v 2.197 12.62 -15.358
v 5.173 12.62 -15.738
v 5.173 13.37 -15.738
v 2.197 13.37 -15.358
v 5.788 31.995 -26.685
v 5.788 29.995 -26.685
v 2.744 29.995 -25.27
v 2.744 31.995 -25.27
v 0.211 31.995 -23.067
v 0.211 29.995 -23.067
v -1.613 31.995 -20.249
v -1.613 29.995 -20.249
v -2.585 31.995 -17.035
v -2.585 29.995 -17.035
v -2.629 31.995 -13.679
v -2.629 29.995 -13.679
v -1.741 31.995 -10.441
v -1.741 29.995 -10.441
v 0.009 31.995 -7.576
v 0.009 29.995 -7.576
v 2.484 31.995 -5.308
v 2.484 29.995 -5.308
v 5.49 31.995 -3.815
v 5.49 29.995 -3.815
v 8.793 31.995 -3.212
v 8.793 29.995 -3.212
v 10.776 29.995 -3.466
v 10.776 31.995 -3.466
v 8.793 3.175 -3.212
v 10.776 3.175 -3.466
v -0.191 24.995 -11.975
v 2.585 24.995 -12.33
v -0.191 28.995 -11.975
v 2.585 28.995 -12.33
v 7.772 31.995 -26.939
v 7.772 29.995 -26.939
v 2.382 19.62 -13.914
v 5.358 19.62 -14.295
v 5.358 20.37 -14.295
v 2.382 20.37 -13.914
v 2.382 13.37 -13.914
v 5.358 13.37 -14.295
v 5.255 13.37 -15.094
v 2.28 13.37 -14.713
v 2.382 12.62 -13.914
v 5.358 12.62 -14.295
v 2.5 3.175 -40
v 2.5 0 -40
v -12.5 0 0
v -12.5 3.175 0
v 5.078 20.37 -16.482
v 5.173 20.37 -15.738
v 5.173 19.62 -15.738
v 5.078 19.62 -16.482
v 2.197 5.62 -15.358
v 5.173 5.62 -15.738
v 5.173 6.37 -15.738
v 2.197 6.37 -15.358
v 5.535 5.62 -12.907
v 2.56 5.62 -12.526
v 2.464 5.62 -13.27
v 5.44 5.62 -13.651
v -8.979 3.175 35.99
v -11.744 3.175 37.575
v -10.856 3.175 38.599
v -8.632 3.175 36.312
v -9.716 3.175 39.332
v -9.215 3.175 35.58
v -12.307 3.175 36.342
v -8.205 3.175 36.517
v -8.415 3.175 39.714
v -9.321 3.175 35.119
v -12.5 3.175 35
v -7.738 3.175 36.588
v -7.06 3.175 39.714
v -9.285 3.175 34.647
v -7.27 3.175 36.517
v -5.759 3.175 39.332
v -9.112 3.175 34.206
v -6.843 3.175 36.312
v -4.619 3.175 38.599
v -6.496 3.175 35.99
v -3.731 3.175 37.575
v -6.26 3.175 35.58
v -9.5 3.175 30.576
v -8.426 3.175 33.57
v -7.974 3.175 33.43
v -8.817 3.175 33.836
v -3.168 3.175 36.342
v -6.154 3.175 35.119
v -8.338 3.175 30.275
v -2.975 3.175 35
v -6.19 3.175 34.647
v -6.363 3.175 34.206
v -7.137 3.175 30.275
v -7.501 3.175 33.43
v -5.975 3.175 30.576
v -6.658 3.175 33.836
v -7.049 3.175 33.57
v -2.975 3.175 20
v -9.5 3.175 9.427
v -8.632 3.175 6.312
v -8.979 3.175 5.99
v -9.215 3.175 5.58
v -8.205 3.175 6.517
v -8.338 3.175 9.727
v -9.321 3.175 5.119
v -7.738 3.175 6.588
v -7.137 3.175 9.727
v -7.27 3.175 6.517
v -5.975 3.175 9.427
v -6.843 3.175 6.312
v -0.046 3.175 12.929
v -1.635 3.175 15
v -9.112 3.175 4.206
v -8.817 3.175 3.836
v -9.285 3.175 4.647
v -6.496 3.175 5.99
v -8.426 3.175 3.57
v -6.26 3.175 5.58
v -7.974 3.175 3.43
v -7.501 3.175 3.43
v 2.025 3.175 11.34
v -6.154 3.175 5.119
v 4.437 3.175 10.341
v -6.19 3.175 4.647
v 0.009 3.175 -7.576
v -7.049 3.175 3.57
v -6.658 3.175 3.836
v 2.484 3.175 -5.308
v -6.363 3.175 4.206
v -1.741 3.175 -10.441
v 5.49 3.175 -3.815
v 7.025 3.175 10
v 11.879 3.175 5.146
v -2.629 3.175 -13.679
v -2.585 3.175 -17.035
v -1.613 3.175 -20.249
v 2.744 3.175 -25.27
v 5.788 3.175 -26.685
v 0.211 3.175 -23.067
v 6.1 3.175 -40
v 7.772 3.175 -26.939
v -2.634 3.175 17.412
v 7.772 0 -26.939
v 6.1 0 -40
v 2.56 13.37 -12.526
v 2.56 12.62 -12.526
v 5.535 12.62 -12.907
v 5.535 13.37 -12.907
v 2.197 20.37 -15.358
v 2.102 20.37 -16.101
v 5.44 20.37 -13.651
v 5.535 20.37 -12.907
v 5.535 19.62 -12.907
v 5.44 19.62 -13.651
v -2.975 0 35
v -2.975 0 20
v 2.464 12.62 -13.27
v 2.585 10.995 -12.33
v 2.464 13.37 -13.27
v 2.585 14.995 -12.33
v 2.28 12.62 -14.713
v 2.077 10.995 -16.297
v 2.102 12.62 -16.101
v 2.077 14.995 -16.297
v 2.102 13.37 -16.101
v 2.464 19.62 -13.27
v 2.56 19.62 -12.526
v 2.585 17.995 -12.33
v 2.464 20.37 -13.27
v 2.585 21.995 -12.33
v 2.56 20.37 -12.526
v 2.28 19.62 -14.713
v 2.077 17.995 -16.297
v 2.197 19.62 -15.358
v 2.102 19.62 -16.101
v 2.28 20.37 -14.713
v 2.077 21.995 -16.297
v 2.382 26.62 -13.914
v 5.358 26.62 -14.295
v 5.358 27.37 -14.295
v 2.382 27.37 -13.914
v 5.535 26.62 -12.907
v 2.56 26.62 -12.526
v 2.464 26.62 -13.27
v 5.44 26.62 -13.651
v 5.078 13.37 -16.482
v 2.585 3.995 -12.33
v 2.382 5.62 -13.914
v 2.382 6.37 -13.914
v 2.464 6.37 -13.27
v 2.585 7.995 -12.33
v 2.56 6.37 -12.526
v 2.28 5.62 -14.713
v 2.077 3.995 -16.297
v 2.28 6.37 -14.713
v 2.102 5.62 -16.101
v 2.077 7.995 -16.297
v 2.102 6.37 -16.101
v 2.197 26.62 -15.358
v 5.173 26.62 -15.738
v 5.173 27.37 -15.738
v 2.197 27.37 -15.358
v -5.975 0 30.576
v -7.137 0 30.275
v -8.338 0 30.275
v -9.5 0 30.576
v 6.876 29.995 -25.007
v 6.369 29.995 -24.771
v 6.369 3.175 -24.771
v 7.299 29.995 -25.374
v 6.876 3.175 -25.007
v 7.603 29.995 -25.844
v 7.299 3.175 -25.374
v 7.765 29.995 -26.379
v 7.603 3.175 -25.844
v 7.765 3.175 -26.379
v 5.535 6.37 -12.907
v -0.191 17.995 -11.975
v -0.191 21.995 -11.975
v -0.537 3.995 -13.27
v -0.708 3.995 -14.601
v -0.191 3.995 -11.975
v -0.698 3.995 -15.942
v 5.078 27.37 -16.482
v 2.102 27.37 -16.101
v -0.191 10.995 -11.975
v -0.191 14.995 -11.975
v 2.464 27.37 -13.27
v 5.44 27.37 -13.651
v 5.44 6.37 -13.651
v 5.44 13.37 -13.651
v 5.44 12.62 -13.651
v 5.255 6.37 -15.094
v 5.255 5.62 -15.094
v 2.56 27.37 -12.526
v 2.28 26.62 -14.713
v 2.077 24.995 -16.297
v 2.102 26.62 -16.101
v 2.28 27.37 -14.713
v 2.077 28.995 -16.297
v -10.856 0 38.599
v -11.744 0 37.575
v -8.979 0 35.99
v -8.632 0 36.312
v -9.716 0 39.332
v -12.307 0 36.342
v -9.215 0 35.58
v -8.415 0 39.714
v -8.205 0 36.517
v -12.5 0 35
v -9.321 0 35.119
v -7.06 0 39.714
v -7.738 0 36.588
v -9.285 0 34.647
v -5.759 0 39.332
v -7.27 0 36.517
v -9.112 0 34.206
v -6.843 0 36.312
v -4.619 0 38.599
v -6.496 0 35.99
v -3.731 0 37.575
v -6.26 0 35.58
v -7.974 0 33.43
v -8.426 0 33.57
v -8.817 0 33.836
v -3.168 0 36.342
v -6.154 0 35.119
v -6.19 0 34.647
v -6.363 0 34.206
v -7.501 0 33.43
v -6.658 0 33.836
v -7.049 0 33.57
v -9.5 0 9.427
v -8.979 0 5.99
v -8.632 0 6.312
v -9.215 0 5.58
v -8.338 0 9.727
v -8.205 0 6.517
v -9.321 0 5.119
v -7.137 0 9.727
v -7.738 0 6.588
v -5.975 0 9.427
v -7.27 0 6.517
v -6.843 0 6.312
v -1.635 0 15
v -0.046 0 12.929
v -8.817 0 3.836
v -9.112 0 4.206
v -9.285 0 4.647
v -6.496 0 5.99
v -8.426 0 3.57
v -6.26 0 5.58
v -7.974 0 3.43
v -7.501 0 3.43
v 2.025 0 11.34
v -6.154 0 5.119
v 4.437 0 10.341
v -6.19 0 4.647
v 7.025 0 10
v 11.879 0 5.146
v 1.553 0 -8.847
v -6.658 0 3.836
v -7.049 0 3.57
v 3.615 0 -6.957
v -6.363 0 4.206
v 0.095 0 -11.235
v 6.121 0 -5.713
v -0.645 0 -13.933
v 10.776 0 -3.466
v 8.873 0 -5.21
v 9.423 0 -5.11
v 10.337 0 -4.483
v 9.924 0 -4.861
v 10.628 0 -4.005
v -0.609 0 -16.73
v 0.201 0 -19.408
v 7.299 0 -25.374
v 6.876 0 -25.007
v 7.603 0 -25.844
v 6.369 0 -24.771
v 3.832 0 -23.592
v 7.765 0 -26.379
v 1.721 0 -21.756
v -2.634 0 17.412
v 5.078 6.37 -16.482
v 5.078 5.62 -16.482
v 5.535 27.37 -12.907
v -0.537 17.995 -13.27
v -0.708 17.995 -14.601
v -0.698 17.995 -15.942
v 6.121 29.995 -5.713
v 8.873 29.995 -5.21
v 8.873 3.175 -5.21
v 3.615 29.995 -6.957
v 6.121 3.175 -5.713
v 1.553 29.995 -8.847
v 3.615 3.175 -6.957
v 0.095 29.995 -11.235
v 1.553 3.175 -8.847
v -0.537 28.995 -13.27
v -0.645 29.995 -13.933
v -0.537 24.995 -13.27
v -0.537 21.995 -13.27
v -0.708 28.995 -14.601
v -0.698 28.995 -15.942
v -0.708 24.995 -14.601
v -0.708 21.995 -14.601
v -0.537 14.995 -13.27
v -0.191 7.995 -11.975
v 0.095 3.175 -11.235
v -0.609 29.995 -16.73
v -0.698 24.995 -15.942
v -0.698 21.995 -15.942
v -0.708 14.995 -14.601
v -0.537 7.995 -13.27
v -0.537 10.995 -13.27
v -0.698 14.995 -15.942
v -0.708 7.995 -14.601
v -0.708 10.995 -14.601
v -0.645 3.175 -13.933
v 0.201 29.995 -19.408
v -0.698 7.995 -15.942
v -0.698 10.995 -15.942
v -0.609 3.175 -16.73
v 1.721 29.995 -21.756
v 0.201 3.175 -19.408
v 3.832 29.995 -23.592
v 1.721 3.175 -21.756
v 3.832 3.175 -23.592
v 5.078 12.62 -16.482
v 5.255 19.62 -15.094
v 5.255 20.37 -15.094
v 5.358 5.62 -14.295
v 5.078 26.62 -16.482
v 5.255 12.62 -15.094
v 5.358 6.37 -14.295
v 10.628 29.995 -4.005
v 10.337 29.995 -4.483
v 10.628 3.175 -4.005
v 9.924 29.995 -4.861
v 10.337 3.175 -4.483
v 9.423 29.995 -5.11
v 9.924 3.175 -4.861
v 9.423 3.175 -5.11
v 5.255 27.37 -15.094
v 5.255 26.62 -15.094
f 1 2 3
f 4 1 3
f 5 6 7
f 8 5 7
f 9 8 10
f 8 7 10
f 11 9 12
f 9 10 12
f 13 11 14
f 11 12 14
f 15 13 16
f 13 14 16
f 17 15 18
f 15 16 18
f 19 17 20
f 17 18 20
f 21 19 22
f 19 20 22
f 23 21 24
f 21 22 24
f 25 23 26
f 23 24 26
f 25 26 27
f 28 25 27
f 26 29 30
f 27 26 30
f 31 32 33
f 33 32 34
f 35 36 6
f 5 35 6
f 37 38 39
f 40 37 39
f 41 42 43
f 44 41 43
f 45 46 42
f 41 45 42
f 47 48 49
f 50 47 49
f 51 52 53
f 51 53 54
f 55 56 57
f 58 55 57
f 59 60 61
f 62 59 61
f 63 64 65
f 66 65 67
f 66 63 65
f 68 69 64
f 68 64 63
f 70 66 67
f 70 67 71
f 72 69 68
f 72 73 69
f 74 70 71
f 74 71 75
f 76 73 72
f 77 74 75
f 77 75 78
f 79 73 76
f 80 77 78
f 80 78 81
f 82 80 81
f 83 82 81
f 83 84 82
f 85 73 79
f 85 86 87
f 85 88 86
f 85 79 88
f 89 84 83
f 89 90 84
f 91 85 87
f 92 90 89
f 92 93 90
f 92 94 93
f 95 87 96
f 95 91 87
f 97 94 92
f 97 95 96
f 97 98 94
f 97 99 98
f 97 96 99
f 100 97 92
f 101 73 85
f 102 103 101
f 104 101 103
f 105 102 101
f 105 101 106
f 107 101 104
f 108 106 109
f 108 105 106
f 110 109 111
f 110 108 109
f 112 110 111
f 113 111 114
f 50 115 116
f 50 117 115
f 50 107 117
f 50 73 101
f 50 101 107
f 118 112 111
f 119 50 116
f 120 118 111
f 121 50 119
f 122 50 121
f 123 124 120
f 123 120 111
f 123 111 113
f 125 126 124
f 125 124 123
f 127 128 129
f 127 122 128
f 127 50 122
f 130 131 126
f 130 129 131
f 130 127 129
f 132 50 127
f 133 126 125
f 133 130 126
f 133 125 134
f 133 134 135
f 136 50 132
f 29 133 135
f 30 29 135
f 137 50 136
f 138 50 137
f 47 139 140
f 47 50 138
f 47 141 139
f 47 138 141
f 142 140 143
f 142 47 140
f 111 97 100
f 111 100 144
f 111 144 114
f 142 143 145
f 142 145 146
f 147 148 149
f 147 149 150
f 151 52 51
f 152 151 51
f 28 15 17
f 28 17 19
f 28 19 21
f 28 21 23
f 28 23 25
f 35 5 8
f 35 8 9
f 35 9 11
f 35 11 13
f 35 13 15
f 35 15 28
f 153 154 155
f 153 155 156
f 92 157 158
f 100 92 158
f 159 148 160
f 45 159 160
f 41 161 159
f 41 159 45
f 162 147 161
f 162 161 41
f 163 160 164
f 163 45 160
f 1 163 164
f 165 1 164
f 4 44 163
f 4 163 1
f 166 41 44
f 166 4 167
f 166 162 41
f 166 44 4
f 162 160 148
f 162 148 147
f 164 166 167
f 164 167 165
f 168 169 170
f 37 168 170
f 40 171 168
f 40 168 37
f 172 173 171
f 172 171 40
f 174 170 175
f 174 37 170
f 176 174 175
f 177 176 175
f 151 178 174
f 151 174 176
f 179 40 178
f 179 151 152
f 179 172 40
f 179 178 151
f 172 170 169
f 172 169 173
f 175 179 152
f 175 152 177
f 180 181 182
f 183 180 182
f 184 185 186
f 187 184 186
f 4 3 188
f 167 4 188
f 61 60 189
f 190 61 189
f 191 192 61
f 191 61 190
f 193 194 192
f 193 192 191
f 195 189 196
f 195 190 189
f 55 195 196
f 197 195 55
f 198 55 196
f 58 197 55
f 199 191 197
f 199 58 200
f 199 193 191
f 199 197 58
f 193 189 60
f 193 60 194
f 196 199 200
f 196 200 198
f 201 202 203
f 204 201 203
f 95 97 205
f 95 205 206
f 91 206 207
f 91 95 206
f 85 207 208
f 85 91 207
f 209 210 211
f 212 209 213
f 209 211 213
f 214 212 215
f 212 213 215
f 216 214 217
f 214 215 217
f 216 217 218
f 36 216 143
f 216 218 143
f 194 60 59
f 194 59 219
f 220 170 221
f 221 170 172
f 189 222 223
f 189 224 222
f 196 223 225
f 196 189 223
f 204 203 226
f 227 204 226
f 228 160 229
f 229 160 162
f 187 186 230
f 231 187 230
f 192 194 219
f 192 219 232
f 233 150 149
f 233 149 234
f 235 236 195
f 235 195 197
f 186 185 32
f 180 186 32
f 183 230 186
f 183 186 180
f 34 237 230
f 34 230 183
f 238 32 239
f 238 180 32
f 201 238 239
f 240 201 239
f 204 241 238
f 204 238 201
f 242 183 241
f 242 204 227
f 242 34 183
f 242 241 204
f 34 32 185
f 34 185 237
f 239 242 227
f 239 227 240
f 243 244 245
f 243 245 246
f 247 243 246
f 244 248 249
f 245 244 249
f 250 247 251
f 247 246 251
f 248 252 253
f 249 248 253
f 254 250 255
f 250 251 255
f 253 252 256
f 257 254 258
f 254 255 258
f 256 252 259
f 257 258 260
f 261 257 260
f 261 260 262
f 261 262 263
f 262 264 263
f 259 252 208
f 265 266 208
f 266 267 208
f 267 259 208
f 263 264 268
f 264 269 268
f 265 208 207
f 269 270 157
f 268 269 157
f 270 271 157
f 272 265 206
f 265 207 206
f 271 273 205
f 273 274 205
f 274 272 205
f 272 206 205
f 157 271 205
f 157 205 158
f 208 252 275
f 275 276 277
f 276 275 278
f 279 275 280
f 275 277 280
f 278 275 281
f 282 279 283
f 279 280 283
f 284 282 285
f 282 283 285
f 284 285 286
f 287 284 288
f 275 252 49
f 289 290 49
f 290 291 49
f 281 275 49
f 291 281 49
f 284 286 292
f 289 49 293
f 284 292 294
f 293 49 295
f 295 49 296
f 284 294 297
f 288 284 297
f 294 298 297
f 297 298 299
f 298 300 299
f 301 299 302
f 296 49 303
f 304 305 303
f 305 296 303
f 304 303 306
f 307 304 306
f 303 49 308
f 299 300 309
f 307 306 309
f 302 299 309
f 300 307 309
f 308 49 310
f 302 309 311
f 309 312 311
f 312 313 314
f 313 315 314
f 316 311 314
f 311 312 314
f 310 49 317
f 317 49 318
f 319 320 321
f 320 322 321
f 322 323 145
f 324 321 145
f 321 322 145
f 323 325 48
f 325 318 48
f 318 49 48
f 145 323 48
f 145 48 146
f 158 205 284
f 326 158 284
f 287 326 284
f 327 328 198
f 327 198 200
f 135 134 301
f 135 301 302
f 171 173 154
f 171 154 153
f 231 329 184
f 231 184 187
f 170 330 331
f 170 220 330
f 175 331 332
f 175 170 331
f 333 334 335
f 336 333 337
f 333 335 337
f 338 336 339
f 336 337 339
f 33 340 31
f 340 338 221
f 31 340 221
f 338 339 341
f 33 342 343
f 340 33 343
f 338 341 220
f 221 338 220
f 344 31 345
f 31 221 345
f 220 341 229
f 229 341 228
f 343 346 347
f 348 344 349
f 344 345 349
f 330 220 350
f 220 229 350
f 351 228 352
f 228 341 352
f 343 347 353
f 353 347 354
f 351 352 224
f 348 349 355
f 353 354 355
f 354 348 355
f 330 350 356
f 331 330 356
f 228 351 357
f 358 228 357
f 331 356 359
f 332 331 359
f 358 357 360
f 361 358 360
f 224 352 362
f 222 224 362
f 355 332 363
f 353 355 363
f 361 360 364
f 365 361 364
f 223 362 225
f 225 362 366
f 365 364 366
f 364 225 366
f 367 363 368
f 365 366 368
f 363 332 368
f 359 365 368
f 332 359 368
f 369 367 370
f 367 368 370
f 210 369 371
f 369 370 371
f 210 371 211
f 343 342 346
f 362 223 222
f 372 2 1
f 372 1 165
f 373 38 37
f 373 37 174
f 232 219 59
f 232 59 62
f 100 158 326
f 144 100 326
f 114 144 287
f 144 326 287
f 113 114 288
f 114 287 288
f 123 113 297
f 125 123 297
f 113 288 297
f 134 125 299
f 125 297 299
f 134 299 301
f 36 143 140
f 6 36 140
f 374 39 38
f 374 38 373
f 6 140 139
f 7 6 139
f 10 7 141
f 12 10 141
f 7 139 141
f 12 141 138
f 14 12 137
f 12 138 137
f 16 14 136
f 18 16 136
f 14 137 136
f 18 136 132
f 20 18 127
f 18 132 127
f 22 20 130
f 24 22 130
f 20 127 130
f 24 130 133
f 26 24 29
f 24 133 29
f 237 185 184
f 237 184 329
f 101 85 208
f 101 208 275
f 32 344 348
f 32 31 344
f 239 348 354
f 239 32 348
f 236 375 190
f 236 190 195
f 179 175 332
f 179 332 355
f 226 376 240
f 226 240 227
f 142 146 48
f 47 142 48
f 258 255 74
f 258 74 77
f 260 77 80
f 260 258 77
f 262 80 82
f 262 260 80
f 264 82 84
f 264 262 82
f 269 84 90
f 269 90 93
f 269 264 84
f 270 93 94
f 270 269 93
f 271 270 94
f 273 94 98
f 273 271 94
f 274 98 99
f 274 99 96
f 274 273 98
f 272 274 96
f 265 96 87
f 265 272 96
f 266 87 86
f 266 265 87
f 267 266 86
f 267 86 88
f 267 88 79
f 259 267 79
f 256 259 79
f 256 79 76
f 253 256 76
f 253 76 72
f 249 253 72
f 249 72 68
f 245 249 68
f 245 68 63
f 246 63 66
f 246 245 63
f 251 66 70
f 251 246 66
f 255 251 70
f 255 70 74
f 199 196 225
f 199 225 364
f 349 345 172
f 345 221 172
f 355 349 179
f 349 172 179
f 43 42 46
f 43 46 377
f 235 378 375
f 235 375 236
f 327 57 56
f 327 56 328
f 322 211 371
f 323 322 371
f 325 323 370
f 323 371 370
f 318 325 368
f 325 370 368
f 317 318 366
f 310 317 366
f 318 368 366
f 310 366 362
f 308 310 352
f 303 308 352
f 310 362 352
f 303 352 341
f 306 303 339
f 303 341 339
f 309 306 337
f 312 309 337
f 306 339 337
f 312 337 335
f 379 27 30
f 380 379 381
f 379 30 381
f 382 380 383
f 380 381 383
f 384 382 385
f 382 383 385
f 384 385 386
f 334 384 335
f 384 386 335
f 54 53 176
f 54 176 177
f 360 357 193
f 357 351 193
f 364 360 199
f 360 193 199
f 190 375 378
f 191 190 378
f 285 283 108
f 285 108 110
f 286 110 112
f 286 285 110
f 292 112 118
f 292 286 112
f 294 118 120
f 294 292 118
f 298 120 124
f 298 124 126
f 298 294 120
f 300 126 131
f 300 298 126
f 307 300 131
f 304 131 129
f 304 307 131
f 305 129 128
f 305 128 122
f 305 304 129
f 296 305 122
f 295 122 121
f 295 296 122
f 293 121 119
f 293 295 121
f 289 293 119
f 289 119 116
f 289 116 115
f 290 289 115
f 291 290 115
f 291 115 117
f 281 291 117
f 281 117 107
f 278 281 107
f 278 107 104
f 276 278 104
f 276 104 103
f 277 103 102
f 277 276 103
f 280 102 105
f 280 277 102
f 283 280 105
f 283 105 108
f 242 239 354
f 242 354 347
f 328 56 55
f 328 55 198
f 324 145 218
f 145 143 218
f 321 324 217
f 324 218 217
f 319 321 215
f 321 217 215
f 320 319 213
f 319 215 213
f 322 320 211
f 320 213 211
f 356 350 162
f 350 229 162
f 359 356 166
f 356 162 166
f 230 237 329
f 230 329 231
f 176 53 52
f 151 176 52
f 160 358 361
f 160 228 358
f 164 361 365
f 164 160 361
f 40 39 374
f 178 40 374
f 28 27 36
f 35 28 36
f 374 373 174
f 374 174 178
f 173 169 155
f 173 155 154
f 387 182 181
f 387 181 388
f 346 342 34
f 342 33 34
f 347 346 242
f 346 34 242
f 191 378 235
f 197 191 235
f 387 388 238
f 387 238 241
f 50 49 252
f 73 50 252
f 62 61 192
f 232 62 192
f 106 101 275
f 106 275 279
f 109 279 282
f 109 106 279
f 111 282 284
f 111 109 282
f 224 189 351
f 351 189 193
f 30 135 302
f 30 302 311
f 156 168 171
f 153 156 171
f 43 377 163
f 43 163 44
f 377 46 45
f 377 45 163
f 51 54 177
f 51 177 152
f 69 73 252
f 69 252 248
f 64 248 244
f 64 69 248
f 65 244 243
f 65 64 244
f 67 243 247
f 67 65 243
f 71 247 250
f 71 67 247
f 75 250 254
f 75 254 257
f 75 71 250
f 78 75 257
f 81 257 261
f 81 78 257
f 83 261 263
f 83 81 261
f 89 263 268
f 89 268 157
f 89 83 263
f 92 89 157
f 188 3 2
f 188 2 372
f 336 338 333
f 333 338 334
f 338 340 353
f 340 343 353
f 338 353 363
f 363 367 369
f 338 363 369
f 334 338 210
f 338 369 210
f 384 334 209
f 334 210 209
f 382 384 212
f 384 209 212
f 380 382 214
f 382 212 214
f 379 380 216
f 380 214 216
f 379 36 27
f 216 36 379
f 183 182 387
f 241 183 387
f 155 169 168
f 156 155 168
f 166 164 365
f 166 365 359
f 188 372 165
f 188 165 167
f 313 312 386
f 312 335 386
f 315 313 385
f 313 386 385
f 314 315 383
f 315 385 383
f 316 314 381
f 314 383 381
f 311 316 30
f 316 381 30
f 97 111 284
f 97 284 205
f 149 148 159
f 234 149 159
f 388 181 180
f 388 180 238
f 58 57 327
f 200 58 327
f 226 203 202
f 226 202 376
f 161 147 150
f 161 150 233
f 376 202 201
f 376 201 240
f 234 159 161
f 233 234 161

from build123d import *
from build123d.topology import SkipClean

# Parameters (mm, degrees)
CROQUIS1_R               = 1.5875
SALIENTE_EXTRUIR1_DEPTH  = 3.175
CORTAR_EXTRUIR1_DEPTH    = 3.175
CORTAR_EXTRUIR3_DEPTH    = 10
CROQUIS4_R               = 10
CORTAR_EXTRUIR4_DEPTH    = 10
REDONDEO1_R              = 2
BOSS_EXTRUDE1_DEPTH      = 26.82
BOSS_EXTRUDE2_DEPTH      = 2
BOSS_EXTRUDE5_REACH      = 56.057
BOSS_EXTRUDE5_END_RADIUS = 10
SKETCH6_W                = 4
SKETCH6_H                = 4
SKETCH7_W                = 0.75
SKETCH7_H                = 0.75
SKETCH7_W_2              = 0.804911675
BOSS_EXTRUDE6_DEPTH      = 3
LPATTERN1_COUNT          = 4
LPATTERN1_PITCH          = 7


with BuildPart() as part:
    # Croquis1 → Saliente-Extruir1 (new body)
    with BuildSketch(Plane(origin=(0, 0, 0), x_dir=(1, 0, 0), z_dir=(0, 1, 0))):
        with BuildLine():
            Line((-12.5, 0), (-12.5, -40))
            Line((-12.5, -40), (-2.975, -40))
            Line((-2.975, -40), (-2.975, -20))
            ThreePointArc((-2.975, -20), (-0.046067812, -12.928932188), (7.025, -10))
            Line((7.025, -10), (12.5, -10))
            Line((12.5, -10), (12.5, 40))
            Line((12.5, 40), (2.5, 40))
            Line((2.5, 40), (-12.5, 0))
        make_face()
        with Locations(Location((-7.7375, -5, 0), (0, 0, 270))):
            Circle(CROQUIS1_R, mode=Mode.SUBTRACT)
        with Locations(Location((-7.7375, -35, 0), (0, 0, 270))):
            Circle(CROQUIS1_R, mode=Mode.SUBTRACT)
    extrude(amount=SALIENTE_EXTRUIR1_DEPTH)

    # Croquis2 → Cortar-Extruir1 (cut)
    with BuildSketch(Plane(origin=(0, 3.175, 0), x_dir=(1, 0, 0), z_dir=(0, 1, 0))):
        Polygon((12.5, -10), (6.1, 40), (12.5, 40), align=None)
    extrude(amount=-CORTAR_EXTRUIR1_DEPTH, mode=Mode.SUBTRACT)

    # Croquis3 → Cortar-Extruir3 (cut)
    with BuildSketch(Plane(origin=(0, 3.175, 0), x_dir=(1, 0, 0), z_dir=(0, 1, 0))):
        with BuildLine():
            ThreePointArc((-5.975, -30.575635639), (-7.7375, -30.2375), (-9.5, -30.575635639))
            Line((-9.5, -30.575635639), (-9.5, -9.427055314))
            ThreePointArc((-9.5, -9.427055314), (-7.7375, -9.765), (-5.975, -9.427055314))
            Line((-5.975, -9.427055314), (-5.975, -14.803847577))
            Line((-5.975, -14.803847577), (-5.975, -30.575635639))
        make_face()
        with BuildLine():
            ThreePointArc((-12.5, -35), (-7.7375, -39.7625), (-2.975, -35))
            Line((-2.975, -35), (-2.975, -40))
            Line((-2.975, -40), (-12.5, -40))
            Line((-12.5, -40), (-12.5, -35))
        make_face()
    extrude(amount=-CORTAR_EXTRUIR3_DEPTH, mode=Mode.SUBTRACT)

    # Croquis4 → Cortar-Extruir4 (cut)
    with BuildSketch(Plane(origin=(0, 3.175, 0), x_dir=(1, 0, 0), z_dir=(0, 1, 0))):
        with Locations((9.274103387, 15.202317292)):
            Circle(CROQUIS4_R)
        Polygon((7.025, -10), (11.878723404, -5.146276596), (12.5, -10), align=None)
    extrude(amount=-CORTAR_EXTRUIR4_DEPTH, mode=Mode.SUBTRACT)

    # Redondeo1
    redondeo1_edges = [part.edges().sort_by_distance(p)[0] for p in [
        (8.004462032, 1.5875, -25.121390375),
        (10.543744741, 1.5875, -5.283244209),
    ]]
    fillet(redondeo1_edges, radius=REDONDEO1_R)

    # Sketch1 → Boss-Extrude1 (add)
    with SkipClean():  # the faces are left unmerged after this step: merging them gives an invalid solid
        with BuildSketch(Plane(origin=(0, 3.175, 0), x_dir=(1, 0, 0), z_dir=(0, 1, 0))):
            with BuildLine():
                Line((7.771843477, 26.938722839), (5.78802886, 26.684794568))
                ThreePointArc((5.78802886, 26.684794568), (-2.628784313, 13.678747666), (8.79254868, 3.211983474))
                Line((8.79254868, 3.211983474), (10.776363297, 3.465911745))
                ThreePointArc((10.776363297, 3.465911745), (10.143802127, 4.686471223), (8.872807798, 5.210372444))
                ThreePointArc((8.872807798, 5.210372444), (-0.644969697, 13.932675937), (6.369041281, 24.771048355))
                ThreePointArc((6.369041281, 24.771048355), (7.467102295, 25.59818866), (7.771843477, 26.938722839))
            make_face()
        extrude(amount=BOSS_EXTRUDE1_DEPTH)

    # Sketch2 → Boss-Extrude2 (add)
    with SkipClean():  # the faces are left unmerged after this step: merging them gives an invalid solid
        with BuildSketch(Plane(origin=(0, 29.995, 0), x_dir=(1, 0, 0), z_dir=(0, 1, 0))):
            with BuildLine():
                Line((10.776363297, 3.465911745), (7.771843477, 26.938722839))
                Line((7.771843477, 26.938722839), (5.78802886, 26.684794568))
                ThreePointArc((5.78802886, 26.684794568), (-2.628784313, 13.678747666), (8.79254868, 3.211983474))
                Line((8.79254868, 3.211983474), (10.776363297, 3.465911745))
            make_face()
        extrude(amount=BOSS_EXTRUDE2_DEPTH)

    # Boss-Extrude5: up to this cylinder (the profile starts inside it)
    with SkipClean():  # the faces are left unmerged after this step: merging them gives an invalid solid
        boss_extrude5_end = Plane(origin=(9.274103387, 26.995, -15.202317292), z_dir=(0, 1, 0)) * Cylinder(BOSS_EXTRUDE5_END_RADIUS, 133.114, mode=Mode.PRIVATE)
        # Sketch6 → Boss-Extrude5 (add, up to the surface)
        with BuildSketch(Plane(origin=(4.095783657, 0, -0.524260308), x_dir=(-0.12696413546540503, 0, -0.9919073083234755), z_dir=(0.9919073083234755, 0, -0.12696413546540503)), mode=Mode.PRIVATE) as boss_extrude5_sk1:
            with Locations((13.901811107, 26.995)):
                Rectangle(SKETCH6_W, SKETCH6_H)
        boss_extrude5_tool1 = extrude(boss_extrude5_sk1.sketch, amount=-BOSS_EXTRUDE5_REACH, mode=Mode.PRIVATE) & boss_extrude5_end
        boss_extrude5 = boss_extrude5_tool1.solids().sort_by_distance((2.330752, 26.995, -14.313568))[0]
        add(boss_extrude5)

    # Sketch7 → Boss-Extrude6 (add)
    with SkipClean():  # the faces are left unmerged after this step: merging them gives an invalid solid
        with BuildSketch(Plane(origin=(4.095783657, 0, -0.524260308), x_dir=(-0.12696413546540503, 0, -0.9919073083234755), z_dir=(0.9919073083234755, 0, -0.12696413546540503))):
            with Locations((15.329266944, 26.995)):
                Rectangle(SKETCH7_W, SKETCH7_H)
            with Locations((13.901811107, 26.995)):
                Rectangle(SKETCH7_W_2, SKETCH7_H)
            with Locations((12.474355269, 26.995)):
                Rectangle(SKETCH7_W, SKETCH7_H)
        boss_extrude6 = extrude(amount=BOSS_EXTRUDE6_DEPTH)

    # LPattern1: Boss-Extrude5, Boss-Extrude6 ×4
    with SkipClean():  # the faces are left unmerged after this step: merging them gives an invalid solid
        with Locations(*[(0, -i * LPATTERN1_PITCH, 0) for i in range(1, LPATTERN1_COUNT)]):
            add(boss_extrude5)
            add(boss_extrude6)


solid = part.part
